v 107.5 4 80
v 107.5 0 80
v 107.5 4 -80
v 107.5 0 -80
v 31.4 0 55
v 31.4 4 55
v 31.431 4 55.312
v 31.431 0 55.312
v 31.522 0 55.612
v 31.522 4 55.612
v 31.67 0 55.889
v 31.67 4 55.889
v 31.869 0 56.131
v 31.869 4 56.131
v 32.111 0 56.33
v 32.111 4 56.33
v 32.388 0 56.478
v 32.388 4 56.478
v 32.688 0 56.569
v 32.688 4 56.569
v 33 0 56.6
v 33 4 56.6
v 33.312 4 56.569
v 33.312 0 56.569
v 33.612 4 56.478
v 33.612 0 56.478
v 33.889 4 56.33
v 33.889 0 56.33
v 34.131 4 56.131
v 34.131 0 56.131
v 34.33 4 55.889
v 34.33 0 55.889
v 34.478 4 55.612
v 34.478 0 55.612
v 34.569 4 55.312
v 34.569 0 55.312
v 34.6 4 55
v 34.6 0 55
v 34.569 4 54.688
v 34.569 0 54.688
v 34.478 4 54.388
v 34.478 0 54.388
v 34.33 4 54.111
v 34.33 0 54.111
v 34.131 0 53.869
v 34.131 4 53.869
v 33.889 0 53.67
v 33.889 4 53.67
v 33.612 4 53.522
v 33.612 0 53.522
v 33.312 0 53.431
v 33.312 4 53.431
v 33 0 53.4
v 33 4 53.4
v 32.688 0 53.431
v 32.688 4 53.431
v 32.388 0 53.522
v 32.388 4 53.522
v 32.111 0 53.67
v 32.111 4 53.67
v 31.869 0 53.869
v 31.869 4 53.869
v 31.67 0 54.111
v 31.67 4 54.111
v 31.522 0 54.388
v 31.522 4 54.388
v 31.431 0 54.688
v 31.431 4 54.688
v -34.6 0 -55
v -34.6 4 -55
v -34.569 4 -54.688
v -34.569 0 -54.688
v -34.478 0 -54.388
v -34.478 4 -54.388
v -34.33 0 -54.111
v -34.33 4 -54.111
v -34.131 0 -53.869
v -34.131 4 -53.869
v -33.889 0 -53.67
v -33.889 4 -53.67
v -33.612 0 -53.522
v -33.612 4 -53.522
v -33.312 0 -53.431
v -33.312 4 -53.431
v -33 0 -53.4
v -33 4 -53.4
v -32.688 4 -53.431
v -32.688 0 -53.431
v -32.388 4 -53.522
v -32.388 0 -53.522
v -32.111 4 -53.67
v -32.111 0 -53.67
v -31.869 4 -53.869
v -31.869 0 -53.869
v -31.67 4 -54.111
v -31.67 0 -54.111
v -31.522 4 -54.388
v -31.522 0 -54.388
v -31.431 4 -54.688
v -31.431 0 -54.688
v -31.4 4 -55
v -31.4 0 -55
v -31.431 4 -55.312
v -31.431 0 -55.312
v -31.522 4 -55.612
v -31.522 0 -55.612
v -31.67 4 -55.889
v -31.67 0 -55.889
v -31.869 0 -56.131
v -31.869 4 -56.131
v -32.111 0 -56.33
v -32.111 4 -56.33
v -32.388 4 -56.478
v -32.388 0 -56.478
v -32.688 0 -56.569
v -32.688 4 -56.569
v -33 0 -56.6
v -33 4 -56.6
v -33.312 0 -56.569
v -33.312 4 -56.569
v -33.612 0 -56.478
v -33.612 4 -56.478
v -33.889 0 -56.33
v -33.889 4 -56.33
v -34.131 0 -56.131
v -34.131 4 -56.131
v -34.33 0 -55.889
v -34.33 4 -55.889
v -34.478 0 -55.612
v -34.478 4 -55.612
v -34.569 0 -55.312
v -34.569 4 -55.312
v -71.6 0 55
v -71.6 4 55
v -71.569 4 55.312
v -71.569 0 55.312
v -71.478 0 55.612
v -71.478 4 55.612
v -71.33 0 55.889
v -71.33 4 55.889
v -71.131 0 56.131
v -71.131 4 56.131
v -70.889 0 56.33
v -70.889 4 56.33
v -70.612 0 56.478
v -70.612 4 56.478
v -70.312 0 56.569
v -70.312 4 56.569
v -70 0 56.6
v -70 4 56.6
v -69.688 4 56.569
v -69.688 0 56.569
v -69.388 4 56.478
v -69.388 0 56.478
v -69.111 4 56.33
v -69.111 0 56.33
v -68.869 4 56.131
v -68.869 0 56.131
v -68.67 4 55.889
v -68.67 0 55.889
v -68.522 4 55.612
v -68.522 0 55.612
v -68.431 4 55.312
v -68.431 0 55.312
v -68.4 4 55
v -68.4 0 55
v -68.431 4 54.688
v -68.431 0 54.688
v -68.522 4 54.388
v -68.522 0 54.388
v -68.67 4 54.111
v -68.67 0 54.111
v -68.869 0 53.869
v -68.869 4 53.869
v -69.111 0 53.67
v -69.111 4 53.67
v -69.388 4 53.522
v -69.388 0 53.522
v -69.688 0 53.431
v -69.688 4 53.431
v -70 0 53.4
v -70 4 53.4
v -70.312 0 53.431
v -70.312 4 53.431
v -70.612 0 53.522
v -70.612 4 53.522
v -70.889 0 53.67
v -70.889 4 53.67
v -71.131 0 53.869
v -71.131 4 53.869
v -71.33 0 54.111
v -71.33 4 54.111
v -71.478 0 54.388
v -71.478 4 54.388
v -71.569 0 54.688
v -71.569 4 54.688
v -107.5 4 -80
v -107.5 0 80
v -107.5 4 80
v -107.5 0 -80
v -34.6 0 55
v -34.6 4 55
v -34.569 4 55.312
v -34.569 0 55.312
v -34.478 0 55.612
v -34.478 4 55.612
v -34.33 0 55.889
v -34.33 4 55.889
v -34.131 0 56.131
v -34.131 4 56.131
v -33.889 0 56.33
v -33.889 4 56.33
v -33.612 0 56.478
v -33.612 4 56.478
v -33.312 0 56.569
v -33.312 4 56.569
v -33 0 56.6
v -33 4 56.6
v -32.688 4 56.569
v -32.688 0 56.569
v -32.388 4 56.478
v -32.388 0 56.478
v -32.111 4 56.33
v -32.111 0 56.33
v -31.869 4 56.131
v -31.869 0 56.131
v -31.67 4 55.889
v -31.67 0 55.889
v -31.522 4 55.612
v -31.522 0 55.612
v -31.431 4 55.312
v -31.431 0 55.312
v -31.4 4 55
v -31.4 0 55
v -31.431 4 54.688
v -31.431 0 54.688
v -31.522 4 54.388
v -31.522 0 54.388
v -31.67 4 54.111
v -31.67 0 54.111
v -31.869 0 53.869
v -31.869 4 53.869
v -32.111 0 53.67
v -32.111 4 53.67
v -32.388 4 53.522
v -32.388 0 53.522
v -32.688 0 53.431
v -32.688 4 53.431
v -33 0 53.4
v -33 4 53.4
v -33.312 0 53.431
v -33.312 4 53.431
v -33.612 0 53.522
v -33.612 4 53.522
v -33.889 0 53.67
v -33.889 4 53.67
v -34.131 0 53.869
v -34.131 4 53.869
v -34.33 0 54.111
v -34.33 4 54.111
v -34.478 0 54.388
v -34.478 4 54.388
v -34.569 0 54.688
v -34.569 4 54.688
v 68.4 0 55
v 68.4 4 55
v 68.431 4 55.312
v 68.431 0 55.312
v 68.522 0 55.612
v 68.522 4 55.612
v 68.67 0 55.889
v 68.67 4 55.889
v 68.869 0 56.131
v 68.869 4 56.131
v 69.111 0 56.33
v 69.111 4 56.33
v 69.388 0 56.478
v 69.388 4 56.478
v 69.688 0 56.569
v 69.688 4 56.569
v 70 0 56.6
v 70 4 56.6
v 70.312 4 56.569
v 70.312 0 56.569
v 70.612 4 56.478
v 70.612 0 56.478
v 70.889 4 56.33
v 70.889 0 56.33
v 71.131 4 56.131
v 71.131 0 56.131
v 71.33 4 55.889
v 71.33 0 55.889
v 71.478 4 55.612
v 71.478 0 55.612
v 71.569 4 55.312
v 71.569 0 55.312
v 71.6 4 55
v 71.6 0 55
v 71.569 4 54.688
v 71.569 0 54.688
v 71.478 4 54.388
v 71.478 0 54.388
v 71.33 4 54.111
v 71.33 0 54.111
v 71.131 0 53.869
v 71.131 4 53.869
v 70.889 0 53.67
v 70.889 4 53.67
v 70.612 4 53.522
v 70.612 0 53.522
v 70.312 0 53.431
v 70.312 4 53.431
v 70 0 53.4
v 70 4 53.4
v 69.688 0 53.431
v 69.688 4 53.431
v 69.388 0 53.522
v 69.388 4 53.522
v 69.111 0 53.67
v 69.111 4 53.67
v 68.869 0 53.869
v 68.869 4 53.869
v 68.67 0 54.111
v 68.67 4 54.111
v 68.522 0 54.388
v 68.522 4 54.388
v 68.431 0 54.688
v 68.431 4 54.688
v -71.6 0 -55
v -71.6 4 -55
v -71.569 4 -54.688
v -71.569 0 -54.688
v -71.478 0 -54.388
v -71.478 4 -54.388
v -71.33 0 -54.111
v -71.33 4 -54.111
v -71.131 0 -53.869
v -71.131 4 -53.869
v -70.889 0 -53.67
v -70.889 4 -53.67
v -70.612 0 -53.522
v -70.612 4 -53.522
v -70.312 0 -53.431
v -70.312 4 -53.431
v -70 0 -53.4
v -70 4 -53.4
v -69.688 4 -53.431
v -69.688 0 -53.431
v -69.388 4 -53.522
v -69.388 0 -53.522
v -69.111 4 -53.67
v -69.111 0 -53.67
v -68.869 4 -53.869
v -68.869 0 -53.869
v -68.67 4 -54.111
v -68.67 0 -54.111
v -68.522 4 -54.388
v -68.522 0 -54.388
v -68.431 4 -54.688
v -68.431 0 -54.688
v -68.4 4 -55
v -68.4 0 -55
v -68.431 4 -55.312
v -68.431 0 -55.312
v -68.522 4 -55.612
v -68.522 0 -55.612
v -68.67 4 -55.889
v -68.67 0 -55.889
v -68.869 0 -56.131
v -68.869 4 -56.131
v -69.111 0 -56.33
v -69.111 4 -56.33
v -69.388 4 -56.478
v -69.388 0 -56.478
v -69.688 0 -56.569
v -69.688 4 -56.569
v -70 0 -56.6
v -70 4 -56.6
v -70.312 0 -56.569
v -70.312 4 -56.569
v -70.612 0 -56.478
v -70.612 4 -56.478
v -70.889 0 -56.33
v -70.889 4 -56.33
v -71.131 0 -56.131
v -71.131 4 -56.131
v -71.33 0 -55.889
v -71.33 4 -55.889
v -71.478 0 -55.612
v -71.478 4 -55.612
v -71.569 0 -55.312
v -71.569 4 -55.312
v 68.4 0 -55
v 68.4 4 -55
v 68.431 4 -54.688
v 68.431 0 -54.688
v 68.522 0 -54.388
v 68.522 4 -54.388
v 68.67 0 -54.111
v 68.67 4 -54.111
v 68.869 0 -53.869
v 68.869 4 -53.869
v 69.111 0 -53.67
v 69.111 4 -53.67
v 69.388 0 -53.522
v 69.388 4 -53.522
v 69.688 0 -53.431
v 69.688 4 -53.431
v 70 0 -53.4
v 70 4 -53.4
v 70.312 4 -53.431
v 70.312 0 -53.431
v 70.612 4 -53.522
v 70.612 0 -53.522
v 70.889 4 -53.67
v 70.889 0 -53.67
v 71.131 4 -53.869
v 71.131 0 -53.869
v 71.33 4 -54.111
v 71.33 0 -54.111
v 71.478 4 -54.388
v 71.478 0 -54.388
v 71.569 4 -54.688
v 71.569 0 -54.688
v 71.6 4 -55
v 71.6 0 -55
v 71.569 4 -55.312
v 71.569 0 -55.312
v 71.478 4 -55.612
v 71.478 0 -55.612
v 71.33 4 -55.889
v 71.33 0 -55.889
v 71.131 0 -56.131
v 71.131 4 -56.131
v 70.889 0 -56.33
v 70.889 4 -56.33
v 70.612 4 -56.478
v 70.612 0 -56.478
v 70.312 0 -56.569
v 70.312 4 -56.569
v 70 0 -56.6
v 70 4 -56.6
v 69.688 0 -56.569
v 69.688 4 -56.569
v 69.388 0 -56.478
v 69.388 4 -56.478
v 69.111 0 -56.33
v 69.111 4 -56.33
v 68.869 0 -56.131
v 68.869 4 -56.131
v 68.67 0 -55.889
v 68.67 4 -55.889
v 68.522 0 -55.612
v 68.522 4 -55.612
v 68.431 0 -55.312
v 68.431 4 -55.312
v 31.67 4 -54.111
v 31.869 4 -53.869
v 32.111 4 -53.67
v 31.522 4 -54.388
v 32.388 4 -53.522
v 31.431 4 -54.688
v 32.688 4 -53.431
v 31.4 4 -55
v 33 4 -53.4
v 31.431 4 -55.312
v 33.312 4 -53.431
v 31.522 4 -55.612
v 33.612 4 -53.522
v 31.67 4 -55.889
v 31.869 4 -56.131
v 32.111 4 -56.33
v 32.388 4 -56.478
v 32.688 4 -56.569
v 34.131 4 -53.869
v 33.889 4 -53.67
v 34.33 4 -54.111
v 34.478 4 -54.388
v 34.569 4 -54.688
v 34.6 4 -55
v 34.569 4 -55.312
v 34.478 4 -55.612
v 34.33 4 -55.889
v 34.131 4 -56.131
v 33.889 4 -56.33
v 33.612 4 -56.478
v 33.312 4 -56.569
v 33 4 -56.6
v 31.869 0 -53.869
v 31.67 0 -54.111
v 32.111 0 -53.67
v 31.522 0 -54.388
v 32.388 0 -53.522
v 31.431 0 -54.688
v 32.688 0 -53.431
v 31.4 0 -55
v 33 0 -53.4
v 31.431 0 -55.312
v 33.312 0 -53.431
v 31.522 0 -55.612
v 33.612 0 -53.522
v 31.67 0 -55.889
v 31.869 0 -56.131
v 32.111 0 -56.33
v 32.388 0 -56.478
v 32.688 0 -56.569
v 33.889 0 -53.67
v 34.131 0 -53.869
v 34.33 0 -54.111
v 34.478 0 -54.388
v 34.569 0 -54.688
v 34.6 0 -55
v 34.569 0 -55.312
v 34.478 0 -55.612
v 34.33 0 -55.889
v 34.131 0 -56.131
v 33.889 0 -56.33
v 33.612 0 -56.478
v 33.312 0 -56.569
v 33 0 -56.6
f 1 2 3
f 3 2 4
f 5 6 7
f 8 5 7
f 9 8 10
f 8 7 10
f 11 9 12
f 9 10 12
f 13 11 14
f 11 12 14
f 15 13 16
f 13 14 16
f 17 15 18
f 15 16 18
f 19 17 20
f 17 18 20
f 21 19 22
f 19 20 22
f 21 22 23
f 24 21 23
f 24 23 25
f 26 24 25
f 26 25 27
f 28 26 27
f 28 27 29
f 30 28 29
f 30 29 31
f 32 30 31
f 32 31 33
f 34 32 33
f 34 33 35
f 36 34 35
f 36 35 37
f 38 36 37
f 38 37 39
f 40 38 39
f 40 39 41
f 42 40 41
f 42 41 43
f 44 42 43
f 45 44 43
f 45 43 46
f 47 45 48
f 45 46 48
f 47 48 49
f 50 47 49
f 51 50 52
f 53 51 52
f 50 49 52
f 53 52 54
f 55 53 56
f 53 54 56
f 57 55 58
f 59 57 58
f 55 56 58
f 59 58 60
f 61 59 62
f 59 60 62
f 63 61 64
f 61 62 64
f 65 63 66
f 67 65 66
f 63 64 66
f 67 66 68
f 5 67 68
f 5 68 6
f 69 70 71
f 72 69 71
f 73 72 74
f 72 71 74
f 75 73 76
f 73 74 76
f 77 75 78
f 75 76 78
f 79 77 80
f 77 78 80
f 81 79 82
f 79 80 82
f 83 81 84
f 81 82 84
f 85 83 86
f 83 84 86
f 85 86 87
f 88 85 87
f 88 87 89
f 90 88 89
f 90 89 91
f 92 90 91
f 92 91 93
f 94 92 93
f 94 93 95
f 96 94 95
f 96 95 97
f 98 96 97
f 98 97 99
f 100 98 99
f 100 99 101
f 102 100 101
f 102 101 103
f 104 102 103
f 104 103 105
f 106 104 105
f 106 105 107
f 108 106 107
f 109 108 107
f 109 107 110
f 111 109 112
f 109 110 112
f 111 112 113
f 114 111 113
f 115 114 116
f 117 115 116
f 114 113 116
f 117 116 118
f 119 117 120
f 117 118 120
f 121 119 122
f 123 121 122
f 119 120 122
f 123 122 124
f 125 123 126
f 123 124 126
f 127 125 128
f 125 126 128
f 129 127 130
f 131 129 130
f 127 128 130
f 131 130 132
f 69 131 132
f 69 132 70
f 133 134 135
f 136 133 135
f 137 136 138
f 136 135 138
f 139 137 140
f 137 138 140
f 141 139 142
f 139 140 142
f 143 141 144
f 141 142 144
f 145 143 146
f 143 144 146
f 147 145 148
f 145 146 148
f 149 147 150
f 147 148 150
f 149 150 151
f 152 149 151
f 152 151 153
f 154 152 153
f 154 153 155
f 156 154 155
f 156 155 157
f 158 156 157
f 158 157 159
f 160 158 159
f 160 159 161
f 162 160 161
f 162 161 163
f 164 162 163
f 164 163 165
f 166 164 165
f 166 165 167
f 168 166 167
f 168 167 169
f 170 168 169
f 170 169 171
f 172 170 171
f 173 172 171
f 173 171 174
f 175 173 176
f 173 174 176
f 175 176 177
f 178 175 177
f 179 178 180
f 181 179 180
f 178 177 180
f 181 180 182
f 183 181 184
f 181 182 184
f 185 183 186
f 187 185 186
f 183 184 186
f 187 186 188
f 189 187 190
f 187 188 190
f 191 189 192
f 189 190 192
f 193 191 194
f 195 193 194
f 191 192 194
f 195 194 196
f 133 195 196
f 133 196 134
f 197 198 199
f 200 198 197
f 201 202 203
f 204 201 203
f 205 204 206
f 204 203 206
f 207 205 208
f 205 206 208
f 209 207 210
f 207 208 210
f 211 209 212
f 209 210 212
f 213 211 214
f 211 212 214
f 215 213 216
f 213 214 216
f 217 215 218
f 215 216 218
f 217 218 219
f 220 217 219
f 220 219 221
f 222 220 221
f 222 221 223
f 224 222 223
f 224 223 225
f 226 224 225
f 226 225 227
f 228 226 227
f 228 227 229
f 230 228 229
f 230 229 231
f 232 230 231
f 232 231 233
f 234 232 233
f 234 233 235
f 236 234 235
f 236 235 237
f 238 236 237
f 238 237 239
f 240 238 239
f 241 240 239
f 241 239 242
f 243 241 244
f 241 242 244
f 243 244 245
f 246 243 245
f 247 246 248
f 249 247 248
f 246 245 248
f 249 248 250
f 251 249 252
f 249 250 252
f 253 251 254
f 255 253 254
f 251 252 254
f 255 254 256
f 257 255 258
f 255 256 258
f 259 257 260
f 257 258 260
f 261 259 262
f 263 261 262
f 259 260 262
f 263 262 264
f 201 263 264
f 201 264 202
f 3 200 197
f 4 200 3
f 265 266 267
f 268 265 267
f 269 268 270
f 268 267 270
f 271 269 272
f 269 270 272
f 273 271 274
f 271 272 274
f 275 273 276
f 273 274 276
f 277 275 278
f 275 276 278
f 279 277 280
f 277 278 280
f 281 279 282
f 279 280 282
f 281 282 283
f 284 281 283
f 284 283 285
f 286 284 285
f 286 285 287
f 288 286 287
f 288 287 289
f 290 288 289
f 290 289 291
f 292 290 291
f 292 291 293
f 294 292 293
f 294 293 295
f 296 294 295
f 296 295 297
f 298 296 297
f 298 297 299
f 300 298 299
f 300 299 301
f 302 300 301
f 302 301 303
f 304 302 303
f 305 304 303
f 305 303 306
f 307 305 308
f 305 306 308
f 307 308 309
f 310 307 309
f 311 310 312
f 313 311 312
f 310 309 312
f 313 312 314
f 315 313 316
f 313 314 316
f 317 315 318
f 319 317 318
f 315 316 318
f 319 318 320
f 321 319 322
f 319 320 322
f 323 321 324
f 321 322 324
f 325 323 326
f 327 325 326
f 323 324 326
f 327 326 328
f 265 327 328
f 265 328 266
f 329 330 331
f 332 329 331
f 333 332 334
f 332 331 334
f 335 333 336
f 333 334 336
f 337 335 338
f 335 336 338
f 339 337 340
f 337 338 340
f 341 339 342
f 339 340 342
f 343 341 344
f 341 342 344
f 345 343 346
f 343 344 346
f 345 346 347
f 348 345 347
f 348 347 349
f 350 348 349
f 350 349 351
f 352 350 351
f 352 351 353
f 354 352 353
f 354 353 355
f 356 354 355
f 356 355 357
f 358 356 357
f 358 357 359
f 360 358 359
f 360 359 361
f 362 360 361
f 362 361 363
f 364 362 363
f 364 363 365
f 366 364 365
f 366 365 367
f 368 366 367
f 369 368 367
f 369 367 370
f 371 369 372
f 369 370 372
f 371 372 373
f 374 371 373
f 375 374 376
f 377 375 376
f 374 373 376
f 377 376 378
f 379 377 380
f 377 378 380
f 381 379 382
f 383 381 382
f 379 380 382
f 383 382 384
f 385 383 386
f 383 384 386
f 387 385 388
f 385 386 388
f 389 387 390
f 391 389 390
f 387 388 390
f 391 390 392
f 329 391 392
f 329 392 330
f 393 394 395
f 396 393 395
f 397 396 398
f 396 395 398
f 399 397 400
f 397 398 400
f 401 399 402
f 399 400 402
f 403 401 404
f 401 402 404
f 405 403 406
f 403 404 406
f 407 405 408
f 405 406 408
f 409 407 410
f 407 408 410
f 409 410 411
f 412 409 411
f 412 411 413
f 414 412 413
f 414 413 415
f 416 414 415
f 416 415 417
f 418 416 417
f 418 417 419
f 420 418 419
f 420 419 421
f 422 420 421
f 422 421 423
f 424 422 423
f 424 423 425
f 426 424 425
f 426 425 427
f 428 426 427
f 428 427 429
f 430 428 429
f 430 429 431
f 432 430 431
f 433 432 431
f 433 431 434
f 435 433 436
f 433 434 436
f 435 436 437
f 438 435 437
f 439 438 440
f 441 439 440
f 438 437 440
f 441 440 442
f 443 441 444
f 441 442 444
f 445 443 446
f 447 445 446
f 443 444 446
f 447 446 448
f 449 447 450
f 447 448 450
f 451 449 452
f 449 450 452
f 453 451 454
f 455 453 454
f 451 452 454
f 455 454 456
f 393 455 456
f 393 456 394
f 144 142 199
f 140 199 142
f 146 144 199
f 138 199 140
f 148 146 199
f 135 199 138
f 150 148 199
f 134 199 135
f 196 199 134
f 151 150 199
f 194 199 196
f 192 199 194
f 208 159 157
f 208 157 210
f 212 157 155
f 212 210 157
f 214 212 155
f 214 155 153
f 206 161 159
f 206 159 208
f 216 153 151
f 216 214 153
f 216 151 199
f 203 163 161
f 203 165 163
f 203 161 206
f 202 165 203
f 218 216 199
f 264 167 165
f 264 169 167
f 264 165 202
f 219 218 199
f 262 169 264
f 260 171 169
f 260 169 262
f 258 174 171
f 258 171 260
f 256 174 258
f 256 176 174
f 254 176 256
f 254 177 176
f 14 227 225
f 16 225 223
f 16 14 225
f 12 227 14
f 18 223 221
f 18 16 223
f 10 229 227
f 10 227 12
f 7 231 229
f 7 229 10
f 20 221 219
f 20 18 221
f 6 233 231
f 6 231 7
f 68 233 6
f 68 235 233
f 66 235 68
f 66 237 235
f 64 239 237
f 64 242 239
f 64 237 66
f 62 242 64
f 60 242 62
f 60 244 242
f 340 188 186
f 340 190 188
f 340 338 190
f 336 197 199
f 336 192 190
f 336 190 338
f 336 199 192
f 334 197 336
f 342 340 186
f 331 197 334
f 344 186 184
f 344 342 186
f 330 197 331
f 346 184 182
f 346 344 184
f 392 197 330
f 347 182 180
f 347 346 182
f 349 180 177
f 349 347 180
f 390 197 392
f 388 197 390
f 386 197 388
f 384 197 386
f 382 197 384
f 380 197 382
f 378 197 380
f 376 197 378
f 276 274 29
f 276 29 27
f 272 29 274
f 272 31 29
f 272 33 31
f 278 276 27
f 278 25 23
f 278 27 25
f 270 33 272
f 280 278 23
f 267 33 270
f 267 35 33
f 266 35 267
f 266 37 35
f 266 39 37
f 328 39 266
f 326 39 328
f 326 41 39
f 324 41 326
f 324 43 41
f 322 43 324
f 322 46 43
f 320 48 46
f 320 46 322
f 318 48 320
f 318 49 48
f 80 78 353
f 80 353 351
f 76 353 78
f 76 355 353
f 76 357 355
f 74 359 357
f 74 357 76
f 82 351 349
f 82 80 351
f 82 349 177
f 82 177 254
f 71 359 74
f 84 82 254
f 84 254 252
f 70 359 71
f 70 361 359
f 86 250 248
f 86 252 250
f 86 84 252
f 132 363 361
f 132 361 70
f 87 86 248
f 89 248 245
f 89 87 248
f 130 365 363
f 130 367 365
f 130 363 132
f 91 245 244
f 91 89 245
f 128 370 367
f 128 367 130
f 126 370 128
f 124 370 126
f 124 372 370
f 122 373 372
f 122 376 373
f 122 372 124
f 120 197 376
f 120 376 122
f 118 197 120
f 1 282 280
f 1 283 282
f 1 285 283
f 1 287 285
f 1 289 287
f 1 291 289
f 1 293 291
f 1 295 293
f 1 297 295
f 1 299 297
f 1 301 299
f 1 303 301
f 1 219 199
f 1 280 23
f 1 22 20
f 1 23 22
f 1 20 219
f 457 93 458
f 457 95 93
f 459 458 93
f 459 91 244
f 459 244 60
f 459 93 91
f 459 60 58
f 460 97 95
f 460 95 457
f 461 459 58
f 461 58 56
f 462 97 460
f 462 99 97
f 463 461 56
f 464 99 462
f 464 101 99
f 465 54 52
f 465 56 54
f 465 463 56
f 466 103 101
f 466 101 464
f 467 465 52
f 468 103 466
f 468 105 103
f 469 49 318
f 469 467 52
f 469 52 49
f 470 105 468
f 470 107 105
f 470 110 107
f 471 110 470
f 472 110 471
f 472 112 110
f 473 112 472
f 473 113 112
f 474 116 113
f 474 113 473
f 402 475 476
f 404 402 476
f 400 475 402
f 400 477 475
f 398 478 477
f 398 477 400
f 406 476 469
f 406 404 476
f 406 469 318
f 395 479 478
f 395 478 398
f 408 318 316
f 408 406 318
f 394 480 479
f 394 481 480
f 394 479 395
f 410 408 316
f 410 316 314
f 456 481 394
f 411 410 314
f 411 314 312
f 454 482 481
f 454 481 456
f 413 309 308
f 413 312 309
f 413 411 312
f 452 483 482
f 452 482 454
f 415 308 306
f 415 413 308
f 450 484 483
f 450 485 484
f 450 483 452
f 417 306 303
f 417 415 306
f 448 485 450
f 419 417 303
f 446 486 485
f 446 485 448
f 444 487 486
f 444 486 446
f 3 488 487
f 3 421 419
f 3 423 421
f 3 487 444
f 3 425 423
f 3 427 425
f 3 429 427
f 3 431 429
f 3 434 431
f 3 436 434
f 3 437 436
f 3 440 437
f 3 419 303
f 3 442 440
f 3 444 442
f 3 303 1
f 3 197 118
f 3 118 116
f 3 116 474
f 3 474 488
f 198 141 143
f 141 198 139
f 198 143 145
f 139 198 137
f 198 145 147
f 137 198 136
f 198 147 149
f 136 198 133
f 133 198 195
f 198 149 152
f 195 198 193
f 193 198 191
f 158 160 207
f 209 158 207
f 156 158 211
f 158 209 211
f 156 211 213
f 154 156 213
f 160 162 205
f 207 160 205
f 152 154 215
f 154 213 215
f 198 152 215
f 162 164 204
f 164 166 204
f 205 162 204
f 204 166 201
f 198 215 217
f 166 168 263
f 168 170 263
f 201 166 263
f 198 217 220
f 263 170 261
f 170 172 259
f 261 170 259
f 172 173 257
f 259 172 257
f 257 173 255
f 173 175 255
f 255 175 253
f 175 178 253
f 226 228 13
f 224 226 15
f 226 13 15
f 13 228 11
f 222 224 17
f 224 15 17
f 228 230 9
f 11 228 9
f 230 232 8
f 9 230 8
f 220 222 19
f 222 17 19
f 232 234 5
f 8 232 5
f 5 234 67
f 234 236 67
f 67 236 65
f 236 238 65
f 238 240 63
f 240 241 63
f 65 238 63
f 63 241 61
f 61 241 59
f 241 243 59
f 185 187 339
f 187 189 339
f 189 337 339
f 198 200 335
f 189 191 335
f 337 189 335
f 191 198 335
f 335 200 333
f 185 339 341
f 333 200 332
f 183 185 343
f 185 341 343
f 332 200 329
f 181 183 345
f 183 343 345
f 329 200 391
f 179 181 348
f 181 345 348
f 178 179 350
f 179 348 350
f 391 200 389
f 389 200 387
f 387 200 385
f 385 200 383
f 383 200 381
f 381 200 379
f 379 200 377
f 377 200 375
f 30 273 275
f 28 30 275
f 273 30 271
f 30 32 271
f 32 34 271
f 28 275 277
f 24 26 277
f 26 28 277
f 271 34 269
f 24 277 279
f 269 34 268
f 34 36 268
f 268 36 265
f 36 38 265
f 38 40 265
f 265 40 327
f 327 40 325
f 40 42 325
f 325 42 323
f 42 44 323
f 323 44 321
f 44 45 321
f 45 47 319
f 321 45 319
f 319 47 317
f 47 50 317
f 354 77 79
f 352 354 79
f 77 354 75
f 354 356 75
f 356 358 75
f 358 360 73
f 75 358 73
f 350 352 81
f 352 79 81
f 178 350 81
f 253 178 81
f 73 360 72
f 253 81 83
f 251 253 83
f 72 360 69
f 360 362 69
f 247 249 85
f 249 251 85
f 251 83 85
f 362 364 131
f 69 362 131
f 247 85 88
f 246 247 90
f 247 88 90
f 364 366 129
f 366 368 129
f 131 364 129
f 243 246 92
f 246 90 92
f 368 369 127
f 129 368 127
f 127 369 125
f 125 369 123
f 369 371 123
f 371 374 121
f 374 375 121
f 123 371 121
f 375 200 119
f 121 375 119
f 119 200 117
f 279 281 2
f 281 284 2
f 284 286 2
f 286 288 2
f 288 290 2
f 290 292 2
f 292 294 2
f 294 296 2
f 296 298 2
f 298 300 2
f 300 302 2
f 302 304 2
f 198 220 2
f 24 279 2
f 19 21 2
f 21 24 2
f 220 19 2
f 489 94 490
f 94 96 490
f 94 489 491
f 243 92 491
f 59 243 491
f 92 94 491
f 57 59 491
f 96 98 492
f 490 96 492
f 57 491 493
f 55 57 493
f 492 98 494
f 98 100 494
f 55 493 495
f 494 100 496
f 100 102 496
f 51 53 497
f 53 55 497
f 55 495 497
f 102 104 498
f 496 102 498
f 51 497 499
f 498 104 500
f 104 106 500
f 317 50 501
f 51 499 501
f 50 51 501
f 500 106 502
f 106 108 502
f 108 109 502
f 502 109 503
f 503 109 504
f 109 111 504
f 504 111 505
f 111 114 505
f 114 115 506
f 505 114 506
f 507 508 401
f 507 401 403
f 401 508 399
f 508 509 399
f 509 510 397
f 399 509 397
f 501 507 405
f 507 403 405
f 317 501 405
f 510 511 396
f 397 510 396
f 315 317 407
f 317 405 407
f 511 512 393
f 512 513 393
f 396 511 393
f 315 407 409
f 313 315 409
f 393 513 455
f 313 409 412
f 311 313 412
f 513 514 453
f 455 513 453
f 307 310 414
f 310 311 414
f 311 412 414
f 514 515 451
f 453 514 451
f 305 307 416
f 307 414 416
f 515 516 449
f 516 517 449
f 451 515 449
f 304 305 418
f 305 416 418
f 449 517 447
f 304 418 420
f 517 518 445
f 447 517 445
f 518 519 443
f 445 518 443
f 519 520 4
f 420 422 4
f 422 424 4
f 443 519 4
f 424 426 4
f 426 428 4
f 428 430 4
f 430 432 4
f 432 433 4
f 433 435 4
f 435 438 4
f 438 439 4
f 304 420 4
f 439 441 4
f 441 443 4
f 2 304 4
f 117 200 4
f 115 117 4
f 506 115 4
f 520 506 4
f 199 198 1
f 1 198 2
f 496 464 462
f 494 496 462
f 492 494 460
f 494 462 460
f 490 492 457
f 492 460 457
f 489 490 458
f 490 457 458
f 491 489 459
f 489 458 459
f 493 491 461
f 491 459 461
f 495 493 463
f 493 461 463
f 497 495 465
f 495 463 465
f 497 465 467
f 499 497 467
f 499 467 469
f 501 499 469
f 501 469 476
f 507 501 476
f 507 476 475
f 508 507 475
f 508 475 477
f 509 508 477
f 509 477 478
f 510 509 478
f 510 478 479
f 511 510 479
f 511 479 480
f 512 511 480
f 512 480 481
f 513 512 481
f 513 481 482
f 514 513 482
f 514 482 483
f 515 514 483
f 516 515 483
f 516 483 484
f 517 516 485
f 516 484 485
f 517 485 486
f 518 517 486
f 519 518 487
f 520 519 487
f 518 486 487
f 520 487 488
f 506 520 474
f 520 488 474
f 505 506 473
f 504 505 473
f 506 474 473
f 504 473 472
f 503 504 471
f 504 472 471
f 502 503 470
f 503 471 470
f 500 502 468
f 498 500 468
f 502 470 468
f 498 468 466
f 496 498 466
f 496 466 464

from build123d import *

# Parameters (mm, degrees)
SKETCH1_W                  = 215
SKETCH1_H                  = 160
BOSS_EXTRUDE1_DEPTH        = 4
F_1_0_3_2_DIAMETER_HOLE1_D = 3.2


with BuildPart() as part:
    # Sketch1 → Boss-Extrude1 (new body)
    with BuildSketch(Plane(origin=(0, 0, 0), x_dir=(1, 0, 0), z_dir=(0, 1, 0))):
        Rectangle(SKETCH1_W, SKETCH1_H)
    extrude(amount=BOSS_EXTRUDE1_DEPTH)

    # Ø1.0 (3.2) Diameter Hole1 (through all)
    with Locations(Plane.XZ):
        with Locations((-70, 55), (33, 55), (-33, 55), (70, 55), (70, -55), (33, -55), (-33, -55), (-70, -55)):
            Hole(F_1_0_3_2_DIAMETER_HOLE1_D / 2)


solid = part.part
